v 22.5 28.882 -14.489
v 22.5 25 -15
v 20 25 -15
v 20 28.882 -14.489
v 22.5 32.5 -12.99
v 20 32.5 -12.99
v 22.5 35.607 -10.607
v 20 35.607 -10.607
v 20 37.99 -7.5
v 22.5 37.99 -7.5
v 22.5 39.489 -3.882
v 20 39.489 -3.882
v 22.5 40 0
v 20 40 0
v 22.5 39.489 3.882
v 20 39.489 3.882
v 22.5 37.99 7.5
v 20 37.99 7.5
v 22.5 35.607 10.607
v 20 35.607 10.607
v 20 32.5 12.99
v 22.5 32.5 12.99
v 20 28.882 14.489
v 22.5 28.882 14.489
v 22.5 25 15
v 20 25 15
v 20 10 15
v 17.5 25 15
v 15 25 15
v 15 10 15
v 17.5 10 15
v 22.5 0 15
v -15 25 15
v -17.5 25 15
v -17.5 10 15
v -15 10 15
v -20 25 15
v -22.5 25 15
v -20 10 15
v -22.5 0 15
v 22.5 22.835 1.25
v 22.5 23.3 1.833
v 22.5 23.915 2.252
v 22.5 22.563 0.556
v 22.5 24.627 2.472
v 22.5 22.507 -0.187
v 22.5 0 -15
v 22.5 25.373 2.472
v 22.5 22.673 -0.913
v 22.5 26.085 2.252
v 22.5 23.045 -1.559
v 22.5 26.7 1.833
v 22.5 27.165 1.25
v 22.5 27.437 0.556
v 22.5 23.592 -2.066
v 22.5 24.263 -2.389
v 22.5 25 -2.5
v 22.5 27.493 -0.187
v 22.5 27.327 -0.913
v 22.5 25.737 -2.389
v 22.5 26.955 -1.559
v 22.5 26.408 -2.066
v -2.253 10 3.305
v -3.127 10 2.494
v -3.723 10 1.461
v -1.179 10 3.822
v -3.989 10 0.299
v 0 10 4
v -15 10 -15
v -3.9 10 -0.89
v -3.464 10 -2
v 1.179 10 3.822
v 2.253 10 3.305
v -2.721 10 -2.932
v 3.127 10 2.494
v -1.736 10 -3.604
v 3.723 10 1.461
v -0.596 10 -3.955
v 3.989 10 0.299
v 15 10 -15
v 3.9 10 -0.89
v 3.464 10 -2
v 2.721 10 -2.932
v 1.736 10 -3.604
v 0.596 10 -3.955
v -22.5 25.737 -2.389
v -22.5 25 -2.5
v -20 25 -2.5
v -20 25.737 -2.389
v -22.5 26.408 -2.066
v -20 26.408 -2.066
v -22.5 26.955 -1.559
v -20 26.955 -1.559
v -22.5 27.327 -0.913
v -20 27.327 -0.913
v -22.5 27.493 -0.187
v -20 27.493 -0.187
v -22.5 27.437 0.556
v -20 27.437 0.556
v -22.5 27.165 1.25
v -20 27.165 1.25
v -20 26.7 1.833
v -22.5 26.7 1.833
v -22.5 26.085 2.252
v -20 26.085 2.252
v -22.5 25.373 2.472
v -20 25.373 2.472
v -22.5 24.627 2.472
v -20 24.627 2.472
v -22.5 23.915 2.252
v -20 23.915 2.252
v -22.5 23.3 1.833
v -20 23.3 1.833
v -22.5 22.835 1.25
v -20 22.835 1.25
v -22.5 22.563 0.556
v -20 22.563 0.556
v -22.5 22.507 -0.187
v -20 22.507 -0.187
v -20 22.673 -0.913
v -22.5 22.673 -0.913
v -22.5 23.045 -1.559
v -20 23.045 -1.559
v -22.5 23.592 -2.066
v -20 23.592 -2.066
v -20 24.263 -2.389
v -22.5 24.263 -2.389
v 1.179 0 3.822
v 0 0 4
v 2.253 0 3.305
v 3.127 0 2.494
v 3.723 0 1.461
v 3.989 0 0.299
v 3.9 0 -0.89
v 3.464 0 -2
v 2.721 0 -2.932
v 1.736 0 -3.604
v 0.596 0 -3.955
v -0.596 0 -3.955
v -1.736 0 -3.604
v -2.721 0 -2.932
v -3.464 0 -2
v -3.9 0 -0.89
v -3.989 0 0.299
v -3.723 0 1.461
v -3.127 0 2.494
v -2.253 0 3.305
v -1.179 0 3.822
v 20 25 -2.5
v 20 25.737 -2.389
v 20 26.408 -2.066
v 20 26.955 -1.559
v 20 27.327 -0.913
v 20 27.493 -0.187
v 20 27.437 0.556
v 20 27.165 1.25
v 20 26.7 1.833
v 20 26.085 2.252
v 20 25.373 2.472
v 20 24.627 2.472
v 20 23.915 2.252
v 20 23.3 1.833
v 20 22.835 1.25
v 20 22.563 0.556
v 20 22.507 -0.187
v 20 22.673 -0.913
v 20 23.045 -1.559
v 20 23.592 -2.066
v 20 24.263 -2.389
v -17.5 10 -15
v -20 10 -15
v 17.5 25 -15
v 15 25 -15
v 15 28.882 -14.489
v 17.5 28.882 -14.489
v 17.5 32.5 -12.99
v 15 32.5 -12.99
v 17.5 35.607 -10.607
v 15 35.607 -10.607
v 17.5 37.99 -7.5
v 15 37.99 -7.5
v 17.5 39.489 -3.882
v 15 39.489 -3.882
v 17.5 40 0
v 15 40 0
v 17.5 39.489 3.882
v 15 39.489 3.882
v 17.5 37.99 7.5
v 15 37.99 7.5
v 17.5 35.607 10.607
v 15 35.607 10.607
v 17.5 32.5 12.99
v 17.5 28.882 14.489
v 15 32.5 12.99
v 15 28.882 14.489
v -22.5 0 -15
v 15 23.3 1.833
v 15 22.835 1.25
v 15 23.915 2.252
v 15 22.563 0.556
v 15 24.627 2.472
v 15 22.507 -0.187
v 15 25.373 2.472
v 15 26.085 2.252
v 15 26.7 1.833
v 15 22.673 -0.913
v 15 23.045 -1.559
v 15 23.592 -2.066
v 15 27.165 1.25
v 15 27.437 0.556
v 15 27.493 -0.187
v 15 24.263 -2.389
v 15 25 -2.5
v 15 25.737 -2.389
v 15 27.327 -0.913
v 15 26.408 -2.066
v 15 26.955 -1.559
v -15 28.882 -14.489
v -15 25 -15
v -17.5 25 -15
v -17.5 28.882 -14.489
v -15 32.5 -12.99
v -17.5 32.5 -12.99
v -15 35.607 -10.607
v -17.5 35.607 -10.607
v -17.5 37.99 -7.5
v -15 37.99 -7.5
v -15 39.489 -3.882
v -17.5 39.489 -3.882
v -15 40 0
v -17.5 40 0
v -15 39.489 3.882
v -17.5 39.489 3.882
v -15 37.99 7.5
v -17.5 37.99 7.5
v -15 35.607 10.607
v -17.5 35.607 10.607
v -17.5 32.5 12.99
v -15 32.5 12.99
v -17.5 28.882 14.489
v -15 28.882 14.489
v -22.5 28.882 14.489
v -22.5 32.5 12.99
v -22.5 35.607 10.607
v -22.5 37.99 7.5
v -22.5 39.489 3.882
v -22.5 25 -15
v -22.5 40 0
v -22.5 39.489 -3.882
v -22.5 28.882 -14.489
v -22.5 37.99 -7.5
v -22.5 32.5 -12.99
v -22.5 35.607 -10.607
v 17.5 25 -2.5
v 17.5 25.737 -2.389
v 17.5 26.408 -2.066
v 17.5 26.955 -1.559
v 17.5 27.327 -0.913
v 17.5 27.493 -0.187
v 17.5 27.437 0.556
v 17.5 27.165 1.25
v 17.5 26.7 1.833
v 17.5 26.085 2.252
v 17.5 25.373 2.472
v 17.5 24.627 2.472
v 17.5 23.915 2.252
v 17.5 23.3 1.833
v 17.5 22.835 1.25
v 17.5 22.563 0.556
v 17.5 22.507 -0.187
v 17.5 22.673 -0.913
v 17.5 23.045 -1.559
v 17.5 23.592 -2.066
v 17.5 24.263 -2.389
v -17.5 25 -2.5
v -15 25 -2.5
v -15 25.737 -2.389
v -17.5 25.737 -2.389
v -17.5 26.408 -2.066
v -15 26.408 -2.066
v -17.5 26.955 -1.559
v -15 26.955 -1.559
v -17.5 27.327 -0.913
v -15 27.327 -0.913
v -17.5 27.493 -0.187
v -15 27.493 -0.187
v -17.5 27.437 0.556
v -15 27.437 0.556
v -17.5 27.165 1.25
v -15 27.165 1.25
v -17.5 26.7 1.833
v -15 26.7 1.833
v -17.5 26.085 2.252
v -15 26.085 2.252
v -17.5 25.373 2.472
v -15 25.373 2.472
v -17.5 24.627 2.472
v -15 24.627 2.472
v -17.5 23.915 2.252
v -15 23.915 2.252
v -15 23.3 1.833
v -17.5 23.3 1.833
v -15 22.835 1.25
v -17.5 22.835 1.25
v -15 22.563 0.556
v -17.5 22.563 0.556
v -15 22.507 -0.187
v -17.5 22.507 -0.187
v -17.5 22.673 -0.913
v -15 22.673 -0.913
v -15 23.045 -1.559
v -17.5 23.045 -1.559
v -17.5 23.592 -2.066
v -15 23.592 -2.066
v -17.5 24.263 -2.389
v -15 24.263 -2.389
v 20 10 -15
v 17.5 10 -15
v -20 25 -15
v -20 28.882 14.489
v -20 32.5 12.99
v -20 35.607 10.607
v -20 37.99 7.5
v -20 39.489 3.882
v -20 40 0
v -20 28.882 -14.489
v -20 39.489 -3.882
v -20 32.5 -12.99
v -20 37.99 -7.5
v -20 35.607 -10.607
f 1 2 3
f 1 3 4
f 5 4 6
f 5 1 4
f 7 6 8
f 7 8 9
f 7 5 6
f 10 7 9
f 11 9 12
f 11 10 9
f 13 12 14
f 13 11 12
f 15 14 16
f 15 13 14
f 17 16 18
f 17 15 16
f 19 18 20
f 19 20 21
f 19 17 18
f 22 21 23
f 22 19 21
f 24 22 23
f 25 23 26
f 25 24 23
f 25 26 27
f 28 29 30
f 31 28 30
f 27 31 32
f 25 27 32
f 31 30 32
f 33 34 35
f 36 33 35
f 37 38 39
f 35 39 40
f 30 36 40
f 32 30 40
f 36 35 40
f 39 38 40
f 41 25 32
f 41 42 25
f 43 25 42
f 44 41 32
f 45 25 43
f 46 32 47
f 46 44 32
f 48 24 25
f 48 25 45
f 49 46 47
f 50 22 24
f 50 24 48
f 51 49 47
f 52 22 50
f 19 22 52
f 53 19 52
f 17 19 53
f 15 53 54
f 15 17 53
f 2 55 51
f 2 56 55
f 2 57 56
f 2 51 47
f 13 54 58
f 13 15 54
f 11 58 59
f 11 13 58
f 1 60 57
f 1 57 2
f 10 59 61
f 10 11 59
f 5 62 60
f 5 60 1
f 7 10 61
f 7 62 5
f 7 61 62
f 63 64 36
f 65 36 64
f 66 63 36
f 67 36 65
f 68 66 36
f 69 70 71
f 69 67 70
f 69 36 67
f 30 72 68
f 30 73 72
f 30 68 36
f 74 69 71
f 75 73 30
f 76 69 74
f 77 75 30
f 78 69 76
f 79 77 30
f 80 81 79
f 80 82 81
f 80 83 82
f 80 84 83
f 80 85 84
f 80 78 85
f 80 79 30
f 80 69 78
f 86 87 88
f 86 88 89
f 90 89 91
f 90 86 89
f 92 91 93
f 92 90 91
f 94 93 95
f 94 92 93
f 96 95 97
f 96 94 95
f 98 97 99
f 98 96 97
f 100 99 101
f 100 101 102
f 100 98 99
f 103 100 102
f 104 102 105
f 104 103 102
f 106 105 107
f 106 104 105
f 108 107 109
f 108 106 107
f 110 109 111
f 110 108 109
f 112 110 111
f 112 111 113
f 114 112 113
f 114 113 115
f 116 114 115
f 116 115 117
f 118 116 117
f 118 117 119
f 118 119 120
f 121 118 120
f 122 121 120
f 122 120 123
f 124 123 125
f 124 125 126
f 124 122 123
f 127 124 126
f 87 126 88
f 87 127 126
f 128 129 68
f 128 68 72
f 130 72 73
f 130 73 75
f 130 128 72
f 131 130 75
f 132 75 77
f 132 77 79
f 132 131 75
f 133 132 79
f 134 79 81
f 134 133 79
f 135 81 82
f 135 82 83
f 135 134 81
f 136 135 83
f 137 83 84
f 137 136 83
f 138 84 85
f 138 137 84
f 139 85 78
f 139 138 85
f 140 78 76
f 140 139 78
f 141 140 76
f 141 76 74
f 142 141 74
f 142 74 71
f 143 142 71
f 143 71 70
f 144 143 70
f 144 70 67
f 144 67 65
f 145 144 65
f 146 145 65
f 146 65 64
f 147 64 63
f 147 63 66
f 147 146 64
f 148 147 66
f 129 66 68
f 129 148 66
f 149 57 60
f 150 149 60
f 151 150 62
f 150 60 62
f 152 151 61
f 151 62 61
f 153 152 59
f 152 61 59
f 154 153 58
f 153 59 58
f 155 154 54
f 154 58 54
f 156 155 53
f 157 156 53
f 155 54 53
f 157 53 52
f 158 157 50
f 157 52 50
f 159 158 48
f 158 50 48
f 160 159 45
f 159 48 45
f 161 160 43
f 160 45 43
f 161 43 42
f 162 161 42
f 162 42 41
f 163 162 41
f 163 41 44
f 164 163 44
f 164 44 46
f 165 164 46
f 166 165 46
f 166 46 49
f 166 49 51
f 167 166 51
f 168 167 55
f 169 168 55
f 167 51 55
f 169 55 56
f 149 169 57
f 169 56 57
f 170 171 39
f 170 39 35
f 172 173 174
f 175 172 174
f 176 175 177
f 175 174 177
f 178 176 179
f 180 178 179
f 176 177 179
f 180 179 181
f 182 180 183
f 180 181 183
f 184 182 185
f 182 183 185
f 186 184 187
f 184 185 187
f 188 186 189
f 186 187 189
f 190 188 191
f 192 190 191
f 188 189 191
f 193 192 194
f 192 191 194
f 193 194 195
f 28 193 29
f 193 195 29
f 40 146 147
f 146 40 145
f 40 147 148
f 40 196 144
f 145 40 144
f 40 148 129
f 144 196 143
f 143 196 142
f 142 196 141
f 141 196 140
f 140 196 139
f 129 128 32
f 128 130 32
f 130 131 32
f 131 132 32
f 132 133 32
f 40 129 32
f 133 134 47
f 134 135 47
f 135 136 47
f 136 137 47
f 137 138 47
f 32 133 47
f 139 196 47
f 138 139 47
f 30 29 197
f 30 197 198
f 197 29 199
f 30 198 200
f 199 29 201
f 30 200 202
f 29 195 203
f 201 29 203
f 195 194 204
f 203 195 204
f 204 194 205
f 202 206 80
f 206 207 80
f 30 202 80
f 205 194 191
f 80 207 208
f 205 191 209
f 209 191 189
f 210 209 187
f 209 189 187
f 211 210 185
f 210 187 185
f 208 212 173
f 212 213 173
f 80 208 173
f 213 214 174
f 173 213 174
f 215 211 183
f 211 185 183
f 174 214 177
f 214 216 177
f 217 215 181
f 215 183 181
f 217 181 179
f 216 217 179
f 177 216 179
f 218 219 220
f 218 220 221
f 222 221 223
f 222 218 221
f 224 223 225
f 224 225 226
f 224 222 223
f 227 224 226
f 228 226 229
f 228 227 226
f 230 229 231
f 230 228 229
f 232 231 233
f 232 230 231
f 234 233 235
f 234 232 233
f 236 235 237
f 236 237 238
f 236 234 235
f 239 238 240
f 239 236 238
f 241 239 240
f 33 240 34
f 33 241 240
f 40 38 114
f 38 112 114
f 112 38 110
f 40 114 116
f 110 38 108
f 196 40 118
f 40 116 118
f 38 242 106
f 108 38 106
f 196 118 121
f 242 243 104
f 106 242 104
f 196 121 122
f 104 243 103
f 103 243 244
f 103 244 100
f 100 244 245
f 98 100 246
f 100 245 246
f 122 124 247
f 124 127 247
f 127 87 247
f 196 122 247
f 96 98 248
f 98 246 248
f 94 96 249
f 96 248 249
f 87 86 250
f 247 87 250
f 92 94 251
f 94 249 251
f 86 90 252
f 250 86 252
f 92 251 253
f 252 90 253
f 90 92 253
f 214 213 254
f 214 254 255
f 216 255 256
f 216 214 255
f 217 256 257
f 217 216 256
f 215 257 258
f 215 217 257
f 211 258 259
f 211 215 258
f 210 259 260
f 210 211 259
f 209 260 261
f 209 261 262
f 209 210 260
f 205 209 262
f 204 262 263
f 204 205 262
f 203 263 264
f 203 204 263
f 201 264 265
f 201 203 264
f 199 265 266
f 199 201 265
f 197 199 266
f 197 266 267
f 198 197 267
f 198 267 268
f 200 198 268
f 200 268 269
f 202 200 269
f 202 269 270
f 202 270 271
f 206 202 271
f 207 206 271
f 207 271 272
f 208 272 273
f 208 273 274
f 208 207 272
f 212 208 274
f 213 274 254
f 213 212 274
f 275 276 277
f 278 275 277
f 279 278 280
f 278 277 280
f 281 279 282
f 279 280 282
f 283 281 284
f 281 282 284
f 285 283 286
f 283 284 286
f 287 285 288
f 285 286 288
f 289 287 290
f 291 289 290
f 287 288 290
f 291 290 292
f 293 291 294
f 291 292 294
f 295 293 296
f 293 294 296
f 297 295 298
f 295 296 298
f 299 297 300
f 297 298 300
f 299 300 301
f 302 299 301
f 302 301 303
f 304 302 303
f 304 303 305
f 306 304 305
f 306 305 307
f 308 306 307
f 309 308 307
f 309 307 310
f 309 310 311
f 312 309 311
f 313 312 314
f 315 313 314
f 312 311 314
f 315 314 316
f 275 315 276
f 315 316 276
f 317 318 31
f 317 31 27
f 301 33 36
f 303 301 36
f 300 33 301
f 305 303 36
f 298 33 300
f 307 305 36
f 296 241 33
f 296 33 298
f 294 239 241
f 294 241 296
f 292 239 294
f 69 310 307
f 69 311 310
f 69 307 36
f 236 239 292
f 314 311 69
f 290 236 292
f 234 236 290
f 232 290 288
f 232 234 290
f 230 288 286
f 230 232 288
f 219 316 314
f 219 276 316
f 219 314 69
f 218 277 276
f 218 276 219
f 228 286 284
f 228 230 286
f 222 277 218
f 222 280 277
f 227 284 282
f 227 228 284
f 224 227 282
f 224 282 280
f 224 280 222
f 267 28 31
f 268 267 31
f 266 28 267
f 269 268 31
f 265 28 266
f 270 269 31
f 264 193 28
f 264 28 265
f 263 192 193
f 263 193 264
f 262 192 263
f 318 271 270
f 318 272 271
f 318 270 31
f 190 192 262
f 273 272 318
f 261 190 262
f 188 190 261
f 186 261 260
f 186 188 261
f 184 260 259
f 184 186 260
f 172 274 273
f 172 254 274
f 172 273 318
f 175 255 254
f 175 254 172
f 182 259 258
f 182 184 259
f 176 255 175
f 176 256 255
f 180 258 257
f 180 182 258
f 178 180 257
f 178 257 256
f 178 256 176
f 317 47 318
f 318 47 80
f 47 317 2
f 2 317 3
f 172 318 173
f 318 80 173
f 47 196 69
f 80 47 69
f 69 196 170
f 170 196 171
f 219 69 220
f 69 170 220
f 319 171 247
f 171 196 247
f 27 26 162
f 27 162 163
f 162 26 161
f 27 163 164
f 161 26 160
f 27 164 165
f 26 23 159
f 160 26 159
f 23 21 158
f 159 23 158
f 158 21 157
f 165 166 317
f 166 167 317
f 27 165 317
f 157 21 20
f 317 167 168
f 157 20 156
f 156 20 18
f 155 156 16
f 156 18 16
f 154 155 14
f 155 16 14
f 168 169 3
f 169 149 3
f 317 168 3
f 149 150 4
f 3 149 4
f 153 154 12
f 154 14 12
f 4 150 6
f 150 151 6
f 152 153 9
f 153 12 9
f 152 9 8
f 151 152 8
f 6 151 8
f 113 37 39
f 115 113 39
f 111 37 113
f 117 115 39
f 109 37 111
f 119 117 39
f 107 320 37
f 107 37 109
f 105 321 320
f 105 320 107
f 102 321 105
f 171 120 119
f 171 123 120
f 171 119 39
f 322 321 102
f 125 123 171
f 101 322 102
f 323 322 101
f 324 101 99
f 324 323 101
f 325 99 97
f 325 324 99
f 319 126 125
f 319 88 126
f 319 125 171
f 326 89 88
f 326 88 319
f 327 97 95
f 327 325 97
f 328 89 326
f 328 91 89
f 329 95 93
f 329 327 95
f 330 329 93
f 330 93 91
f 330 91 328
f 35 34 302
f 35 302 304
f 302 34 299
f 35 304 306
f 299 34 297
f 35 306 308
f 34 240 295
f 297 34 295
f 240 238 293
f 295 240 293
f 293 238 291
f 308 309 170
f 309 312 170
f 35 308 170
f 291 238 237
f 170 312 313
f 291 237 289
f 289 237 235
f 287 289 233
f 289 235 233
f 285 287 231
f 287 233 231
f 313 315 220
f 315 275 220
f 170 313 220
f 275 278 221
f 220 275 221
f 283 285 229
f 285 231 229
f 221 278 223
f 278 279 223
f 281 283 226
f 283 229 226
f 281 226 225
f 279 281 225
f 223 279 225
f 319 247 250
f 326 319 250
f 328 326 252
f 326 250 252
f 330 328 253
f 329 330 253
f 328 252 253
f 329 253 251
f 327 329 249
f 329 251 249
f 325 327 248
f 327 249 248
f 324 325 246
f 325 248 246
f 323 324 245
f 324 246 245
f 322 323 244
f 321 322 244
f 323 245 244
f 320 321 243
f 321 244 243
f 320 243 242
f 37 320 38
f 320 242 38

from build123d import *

# Parameters (mm, degrees)
SKETCH1_W               = 45
SKETCH1_H               = 30
SKETCH1_R               = 4
BOSS_EXTRUDE1_DEPTH     = 10
SKETCH2_R               = 2.5
BOSS_EXTRUDE2_DEPTH     = 2.5
MIRROR3_COPY_1_SKETCH_R = 2.5
MIRROR3_COPY_1_DEPTH    = 2.5


with BuildPart() as part:
    # Sketch1 → Boss-Extrude1 (new body)
    with BuildSketch(Plane(origin=(0, 0, 0), x_dir=(1, 0, 0), z_dir=(0, 1, 0))):
        Rectangle(SKETCH1_W, SKETCH1_H)
        with Locations(Location((0, 0, 0), (0, 0, 270))):
            Circle(SKETCH1_R, mode=Mode.SUBTRACT)
    extrude(amount=BOSS_EXTRUDE1_DEPTH)

    # Sketch2 → Boss-Extrude2 (add)
    with BuildSketch(Plane(origin=(22.5, 0, 0), x_dir=(0, 0, -1), z_dir=(1, 0, 0))):
        with BuildLine():
            Line((-15, 10), (15, 10))
            Line((15, 10), (15, 25))
            ThreePointArc((15, 25), (0, 40), (-15, 25))
            Line((-15, 25), (-15, 10))
        make_face()
        with Locations((0, 25)):
            Circle(SKETCH2_R, mode=Mode.SUBTRACT)
    boss_extrude2 = extrude(amount=-BOSS_EXTRUDE2_DEPTH)

    # Mirror2: Boss-Extrude2 across plane
    add(boss_extrude2.mirror(Plane(origin=(18.75, 0, 0), x_dir=(0, 0, 1), z_dir=(1, 0, 0))))

    # Mirror3: Boss-Extrude2 across plane
    add(boss_extrude2.mirror(Plane(origin=(0, 0, 0), x_dir=(0, 0, 1), z_dir=(1, 0, 0))))

    # Mirror3 copy 1 sketch → Mirror3 copy 1 (add)
    with BuildSketch(Plane(origin=(-15, 0, 0), x_dir=(0, 0, -1), z_dir=(1, 0, 0))):
        with BuildLine():
            Line((-15, 10), (15, 10))
            Line((15, 10), (15, 25))
            ThreePointArc((15, 25), (0, 40), (-15, 25))
            Line((-15, 25), (-15, 10))
        make_face()
        with Locations((0, 25)):
            Circle(MIRROR3_COPY_1_SKETCH_R, mode=Mode.SUBTRACT)
    extrude(amount=-MIRROR3_COPY_1_DEPTH)


solid = part.part
